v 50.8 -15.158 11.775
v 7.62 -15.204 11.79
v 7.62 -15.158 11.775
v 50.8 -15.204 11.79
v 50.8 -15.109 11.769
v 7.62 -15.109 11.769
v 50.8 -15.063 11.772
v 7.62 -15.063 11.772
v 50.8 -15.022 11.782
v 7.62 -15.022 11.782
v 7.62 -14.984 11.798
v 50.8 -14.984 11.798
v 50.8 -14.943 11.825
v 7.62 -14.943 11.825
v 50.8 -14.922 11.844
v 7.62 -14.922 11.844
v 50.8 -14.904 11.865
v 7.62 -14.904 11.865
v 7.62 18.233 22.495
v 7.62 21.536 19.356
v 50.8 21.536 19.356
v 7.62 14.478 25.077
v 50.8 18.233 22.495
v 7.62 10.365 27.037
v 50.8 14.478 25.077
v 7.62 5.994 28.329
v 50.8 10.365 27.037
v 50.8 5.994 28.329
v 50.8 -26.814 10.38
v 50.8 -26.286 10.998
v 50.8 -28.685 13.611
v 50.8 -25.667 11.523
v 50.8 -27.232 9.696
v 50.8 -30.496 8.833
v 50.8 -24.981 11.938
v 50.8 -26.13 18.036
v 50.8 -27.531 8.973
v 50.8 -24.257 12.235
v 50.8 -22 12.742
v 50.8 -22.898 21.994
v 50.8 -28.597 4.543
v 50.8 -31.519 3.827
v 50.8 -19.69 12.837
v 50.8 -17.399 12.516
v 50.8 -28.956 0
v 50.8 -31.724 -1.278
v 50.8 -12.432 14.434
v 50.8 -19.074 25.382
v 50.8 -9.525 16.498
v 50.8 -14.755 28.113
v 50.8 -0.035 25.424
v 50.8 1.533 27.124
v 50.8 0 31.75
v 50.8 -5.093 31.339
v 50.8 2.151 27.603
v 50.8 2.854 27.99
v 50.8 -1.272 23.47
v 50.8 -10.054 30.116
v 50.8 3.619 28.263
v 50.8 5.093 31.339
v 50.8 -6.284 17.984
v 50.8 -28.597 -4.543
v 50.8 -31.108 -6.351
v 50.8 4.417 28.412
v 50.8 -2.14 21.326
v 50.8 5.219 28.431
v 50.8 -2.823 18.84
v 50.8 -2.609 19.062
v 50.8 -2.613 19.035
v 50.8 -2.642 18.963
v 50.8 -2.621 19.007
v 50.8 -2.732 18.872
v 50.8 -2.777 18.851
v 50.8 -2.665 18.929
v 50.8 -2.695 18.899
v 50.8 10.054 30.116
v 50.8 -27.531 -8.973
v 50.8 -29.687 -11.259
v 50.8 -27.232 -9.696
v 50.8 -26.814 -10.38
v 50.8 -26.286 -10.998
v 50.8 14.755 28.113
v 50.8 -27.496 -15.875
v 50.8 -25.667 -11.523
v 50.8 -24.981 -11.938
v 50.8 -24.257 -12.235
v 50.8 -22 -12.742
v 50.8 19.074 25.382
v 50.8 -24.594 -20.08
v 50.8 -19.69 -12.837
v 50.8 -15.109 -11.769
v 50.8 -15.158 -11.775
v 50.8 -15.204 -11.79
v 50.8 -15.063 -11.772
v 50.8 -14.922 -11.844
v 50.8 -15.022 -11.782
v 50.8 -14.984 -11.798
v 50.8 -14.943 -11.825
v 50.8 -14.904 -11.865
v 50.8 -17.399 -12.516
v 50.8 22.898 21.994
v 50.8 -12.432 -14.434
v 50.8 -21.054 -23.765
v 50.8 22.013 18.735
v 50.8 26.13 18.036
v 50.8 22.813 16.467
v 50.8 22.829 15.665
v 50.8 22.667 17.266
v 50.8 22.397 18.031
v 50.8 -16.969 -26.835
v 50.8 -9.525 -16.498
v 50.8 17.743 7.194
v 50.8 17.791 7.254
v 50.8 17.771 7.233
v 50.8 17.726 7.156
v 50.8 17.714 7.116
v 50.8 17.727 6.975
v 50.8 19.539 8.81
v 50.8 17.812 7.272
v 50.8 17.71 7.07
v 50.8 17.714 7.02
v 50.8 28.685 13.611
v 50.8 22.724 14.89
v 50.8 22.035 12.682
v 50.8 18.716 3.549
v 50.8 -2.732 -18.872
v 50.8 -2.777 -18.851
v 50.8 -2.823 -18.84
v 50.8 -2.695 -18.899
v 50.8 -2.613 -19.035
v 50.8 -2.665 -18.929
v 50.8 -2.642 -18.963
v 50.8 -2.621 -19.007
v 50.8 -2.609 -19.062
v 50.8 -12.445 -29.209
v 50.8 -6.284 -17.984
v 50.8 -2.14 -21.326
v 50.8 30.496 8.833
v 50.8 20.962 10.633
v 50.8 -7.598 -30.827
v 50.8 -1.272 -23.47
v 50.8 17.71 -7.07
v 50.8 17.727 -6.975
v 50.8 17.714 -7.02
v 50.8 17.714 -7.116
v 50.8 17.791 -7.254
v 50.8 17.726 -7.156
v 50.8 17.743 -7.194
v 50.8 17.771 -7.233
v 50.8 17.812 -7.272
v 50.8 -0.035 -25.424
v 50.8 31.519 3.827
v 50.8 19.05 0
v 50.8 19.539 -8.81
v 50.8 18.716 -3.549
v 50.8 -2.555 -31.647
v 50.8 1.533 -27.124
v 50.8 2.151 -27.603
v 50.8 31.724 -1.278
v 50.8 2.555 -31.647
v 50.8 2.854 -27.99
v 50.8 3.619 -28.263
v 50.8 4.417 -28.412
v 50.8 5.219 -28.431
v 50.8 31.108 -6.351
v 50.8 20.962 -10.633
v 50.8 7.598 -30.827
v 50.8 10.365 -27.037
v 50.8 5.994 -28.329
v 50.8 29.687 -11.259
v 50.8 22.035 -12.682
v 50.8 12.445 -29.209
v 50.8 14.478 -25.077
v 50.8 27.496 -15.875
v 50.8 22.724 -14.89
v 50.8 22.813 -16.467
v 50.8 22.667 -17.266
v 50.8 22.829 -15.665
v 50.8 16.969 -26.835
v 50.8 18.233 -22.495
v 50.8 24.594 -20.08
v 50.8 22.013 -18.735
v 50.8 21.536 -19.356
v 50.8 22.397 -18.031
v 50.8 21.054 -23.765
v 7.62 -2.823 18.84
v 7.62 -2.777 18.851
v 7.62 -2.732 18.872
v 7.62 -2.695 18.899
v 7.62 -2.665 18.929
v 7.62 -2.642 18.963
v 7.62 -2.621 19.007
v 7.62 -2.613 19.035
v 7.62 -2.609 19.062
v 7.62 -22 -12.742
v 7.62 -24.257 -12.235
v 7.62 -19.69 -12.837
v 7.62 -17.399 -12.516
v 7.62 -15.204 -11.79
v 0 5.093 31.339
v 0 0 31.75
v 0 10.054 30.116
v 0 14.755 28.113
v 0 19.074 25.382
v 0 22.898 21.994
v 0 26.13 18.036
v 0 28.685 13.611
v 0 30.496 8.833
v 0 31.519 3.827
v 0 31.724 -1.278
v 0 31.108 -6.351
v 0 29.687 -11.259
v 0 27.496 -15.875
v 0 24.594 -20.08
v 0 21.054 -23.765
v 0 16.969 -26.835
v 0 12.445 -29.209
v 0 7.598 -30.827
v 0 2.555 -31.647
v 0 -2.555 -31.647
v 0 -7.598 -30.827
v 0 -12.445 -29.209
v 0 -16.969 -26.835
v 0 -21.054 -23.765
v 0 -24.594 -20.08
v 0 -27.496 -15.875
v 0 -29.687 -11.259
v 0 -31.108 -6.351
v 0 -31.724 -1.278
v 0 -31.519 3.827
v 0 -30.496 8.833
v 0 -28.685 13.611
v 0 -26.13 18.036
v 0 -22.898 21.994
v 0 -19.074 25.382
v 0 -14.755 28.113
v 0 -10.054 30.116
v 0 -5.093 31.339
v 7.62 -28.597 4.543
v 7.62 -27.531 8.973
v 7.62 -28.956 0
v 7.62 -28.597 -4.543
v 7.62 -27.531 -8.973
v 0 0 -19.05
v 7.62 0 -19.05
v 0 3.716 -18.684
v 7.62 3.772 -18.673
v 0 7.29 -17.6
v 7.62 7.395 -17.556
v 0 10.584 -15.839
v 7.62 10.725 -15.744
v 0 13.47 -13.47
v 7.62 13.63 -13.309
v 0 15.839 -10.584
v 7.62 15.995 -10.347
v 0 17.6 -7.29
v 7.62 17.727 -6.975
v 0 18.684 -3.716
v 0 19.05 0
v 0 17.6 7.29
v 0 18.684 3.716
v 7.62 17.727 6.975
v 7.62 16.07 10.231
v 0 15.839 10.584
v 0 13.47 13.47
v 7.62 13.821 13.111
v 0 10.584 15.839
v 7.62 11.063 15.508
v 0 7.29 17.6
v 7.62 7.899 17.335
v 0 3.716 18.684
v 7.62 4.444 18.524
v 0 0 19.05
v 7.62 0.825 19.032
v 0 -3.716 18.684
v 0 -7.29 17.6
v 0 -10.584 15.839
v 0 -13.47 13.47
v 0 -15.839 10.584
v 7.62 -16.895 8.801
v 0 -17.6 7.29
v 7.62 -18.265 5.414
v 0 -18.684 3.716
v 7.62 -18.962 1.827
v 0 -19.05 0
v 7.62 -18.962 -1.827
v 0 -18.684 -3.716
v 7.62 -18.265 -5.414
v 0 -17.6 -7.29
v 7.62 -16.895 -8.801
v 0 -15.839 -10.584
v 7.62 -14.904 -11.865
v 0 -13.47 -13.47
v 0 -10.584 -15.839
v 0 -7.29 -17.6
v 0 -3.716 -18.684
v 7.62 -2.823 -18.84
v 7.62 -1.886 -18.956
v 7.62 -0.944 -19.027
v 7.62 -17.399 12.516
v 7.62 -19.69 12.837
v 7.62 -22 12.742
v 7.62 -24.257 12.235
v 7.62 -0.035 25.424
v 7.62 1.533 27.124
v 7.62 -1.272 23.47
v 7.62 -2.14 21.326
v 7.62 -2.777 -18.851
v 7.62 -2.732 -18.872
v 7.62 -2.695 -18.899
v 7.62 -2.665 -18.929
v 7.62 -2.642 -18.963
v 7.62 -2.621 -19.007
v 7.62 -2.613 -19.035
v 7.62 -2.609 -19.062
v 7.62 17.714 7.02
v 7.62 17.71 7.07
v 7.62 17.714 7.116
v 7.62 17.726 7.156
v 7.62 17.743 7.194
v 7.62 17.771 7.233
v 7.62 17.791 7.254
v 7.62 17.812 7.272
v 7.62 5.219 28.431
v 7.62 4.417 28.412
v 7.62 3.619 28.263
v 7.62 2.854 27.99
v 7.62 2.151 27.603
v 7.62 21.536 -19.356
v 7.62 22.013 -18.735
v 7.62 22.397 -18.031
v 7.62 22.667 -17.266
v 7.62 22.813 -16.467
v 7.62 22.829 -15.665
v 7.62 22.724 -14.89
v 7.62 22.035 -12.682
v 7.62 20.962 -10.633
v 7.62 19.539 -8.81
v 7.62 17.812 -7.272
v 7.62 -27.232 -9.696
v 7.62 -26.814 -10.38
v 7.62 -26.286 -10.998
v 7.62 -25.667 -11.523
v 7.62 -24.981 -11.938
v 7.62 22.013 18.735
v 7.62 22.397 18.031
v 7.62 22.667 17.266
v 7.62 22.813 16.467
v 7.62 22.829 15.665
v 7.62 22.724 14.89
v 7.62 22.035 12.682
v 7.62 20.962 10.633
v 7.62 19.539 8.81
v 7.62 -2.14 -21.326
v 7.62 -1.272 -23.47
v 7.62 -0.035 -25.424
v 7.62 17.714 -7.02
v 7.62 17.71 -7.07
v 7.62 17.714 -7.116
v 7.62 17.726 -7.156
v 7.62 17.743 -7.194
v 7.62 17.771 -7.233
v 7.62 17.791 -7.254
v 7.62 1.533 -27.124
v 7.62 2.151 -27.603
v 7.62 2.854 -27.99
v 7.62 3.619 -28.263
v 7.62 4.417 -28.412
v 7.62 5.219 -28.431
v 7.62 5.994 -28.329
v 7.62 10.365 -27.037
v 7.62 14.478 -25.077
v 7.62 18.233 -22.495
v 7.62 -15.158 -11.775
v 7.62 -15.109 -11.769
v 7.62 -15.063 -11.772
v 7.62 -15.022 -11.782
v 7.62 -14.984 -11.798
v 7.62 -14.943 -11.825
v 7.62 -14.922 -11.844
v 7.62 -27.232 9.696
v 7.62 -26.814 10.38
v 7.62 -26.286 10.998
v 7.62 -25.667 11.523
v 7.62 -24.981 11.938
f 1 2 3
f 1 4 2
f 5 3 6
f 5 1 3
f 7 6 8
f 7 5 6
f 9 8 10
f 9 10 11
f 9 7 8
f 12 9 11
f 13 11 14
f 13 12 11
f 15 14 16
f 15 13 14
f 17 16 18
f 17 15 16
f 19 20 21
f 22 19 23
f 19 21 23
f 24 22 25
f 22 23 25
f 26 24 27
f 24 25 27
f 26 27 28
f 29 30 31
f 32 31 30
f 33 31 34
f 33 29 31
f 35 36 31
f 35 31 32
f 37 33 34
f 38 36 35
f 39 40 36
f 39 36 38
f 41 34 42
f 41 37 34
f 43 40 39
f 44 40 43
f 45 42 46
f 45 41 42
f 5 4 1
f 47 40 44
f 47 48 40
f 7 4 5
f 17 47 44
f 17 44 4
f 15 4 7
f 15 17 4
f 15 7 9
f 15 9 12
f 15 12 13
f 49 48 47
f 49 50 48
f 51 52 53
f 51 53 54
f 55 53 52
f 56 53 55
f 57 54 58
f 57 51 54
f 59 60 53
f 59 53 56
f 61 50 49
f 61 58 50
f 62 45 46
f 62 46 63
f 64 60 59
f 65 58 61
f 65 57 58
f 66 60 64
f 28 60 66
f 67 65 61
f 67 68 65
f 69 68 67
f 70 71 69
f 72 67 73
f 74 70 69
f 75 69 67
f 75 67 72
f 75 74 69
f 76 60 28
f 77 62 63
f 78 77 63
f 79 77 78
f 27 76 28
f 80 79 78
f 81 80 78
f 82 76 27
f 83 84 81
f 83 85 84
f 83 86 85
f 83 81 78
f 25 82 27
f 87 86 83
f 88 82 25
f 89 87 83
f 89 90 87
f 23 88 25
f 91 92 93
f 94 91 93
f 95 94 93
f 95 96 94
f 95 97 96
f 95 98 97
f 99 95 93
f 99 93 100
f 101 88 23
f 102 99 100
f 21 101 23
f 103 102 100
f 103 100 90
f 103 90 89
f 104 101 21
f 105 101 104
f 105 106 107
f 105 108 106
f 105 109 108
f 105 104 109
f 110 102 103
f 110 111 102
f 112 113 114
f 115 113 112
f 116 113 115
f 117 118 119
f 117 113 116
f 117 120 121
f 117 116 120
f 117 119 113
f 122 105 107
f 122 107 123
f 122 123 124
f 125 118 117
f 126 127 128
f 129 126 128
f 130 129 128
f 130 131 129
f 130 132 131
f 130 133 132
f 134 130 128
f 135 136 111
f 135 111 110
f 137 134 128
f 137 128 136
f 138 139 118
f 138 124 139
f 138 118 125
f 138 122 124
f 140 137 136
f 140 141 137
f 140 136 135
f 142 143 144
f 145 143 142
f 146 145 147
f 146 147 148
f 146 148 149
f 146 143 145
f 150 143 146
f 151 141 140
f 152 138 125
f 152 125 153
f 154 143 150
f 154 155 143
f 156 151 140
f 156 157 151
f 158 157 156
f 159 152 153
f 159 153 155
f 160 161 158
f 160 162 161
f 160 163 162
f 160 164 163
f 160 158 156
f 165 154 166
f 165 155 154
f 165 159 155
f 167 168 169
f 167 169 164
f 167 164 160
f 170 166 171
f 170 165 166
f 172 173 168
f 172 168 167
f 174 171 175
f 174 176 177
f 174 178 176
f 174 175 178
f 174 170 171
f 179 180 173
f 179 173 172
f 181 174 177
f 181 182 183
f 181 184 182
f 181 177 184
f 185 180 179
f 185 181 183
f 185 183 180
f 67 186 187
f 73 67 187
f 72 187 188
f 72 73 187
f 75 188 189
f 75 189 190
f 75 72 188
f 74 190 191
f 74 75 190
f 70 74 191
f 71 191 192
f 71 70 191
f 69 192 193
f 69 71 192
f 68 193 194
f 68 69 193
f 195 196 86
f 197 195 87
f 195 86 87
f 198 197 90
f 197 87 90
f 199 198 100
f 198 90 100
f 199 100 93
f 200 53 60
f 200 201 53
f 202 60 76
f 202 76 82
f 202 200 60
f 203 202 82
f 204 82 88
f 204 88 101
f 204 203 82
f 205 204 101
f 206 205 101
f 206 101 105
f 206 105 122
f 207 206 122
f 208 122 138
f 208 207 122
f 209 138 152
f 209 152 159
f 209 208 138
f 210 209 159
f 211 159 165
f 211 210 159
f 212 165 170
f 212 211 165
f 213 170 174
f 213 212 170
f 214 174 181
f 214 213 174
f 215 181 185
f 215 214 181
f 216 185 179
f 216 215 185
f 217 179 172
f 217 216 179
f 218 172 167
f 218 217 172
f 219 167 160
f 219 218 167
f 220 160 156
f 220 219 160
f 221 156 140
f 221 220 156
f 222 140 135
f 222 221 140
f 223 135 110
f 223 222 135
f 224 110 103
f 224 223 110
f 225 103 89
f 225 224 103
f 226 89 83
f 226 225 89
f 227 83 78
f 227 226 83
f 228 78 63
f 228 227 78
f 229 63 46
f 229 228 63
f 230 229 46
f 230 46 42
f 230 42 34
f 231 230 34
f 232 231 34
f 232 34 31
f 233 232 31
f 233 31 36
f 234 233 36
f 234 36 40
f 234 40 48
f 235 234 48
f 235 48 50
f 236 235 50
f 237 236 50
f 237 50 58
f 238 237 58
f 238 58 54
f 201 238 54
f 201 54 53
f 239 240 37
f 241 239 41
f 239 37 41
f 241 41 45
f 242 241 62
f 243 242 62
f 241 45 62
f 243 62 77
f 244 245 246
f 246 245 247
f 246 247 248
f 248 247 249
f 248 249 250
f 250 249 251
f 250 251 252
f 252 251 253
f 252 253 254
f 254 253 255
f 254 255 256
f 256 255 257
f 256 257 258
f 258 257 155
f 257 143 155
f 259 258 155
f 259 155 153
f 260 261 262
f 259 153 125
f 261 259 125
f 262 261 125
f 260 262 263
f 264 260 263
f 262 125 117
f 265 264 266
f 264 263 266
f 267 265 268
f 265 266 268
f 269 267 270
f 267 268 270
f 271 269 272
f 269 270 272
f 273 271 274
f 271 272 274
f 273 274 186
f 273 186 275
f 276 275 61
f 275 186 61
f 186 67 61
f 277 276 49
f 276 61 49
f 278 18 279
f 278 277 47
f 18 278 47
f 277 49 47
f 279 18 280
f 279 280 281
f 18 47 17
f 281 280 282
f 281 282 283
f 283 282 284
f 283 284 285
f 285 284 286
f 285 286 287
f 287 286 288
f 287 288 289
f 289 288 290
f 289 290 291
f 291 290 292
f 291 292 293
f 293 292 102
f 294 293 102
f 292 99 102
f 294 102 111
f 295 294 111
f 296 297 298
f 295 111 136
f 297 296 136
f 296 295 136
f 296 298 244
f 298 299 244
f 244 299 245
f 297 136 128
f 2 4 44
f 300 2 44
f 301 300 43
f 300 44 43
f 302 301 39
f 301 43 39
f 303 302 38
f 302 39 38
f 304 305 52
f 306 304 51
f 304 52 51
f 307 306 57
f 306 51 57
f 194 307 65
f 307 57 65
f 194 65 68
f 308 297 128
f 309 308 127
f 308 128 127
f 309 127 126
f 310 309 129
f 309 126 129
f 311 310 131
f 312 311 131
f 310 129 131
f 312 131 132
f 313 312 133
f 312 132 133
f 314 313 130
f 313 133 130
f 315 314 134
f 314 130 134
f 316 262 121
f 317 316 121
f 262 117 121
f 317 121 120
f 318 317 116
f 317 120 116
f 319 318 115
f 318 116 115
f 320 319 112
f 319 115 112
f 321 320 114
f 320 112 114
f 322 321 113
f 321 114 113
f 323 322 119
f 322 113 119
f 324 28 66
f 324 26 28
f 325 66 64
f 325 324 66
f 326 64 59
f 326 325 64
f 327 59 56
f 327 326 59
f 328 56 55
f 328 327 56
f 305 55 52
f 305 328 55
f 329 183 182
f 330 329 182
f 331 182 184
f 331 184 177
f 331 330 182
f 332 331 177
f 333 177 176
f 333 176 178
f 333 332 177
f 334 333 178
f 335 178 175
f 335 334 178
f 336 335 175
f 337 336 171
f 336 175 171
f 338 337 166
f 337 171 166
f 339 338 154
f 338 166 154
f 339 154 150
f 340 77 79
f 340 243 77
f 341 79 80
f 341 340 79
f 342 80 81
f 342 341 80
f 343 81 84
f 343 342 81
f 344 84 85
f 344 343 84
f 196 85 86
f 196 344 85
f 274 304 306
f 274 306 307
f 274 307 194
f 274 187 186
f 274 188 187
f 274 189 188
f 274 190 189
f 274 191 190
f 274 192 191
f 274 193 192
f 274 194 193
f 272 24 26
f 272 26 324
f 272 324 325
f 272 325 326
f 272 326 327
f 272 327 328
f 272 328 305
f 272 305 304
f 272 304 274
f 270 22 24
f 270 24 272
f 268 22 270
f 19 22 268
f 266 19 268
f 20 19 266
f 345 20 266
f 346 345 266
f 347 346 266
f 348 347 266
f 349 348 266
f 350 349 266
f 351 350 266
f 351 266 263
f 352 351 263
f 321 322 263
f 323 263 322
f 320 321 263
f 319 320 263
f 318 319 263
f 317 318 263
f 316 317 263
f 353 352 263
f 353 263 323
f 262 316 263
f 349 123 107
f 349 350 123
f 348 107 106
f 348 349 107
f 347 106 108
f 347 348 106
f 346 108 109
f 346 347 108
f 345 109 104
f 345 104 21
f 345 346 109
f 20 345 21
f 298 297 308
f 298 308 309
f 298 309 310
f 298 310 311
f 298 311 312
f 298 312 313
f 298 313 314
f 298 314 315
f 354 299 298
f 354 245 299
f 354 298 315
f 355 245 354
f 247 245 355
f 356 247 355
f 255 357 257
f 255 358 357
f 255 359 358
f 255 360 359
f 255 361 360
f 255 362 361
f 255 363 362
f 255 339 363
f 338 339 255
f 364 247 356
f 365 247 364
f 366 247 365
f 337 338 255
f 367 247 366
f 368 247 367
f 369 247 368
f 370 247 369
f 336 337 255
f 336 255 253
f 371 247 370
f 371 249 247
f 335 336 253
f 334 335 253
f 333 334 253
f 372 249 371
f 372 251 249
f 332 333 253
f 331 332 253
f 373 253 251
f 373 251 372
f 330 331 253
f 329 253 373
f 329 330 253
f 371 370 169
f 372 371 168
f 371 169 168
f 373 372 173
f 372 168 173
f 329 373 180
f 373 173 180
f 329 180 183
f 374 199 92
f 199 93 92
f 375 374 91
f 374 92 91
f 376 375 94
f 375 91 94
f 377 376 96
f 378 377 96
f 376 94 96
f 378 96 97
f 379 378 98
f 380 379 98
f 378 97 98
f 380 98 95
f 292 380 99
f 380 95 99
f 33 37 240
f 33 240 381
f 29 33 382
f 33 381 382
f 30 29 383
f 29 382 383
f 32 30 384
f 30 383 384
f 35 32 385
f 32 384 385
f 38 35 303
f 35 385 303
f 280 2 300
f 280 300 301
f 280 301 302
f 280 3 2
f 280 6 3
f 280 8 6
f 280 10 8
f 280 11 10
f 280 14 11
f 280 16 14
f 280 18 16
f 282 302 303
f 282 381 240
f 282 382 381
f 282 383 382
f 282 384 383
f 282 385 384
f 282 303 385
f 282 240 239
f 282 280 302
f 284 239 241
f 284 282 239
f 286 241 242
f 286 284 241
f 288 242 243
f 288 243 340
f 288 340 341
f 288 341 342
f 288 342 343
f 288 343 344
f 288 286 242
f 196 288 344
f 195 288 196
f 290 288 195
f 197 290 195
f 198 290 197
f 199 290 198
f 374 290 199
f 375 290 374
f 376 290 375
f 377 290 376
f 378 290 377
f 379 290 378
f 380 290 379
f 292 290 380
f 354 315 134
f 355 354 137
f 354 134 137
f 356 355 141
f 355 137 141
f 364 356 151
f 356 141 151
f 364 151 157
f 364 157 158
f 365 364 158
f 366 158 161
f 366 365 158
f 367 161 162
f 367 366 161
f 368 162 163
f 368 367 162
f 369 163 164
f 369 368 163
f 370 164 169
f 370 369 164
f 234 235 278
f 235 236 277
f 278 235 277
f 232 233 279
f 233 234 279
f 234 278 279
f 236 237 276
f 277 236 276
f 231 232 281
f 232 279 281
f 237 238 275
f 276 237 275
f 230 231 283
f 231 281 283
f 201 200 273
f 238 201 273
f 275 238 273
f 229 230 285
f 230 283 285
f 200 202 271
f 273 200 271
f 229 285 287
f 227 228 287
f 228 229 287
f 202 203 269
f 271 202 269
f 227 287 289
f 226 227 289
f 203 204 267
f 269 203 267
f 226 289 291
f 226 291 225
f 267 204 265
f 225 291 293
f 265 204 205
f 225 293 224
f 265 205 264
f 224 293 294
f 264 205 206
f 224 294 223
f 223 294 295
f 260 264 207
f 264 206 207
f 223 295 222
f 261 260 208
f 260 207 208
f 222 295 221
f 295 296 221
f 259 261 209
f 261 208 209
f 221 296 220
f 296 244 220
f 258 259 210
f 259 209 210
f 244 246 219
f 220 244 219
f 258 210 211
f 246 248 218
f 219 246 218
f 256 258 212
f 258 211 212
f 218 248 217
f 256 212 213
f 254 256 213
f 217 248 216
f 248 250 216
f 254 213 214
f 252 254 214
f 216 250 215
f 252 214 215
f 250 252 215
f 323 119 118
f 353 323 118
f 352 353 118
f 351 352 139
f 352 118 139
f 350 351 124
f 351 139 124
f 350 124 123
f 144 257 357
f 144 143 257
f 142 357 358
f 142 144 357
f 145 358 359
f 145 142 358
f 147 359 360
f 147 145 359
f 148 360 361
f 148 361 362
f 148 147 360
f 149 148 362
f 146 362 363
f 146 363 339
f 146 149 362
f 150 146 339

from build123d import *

# Parameters (mm, degrees)
SKETCH1_W             = 50.8
SKETCH1_H             = 31.75
CUT_EXTRUDE1_DEPTH    = 43.18
CUT_EXTRUDE2_DEPTH    = 43.18
CUT_EXTRUDE3_DEPTH    = 43.18
M36_CLEARANCE_HOLE1_D = 38.1
FILLET1_R             = 5.08
FILLET2_R             = 0.254


with BuildPart() as part:
    # Sketch1 → Revolve1 (revolve)
    with BuildSketch(Plane(origin=(0, 0, 0), x_dir=(-1, 0, 0), z_dir=(0, 0, -1)), mode=Mode.PRIVATE) as revolve1_sk:
        with Locations((-25.4, 15.875)):
            Rectangle(SKETCH1_W, SKETCH1_H)
    revolve(revolve1_sk.sketch.rotate(Axis((50.8, 0, 0), (-1, 0, 0)), 270), axis=Axis((50.8, 0, 0), (-1, 0, 0)))

    # Sketch2 → Cut-Extrude1 (cut)
    with BuildSketch(Plane(origin=(50.8, 0, 0), x_dir=(0, 0, -1), z_dir=(1, 0, 0))):
        with BuildLine():
            ThreePointArc((-17.574990767, 23.012380049), (-25.076631592, 14.478), (-28.716801108, 3.714198451))
            ThreePointArc((-28.716801108, 3.714198451), (-6.467131306, 3.7338), (-17.574990767, 23.012380049))
        make_face()
    extrude(amount=-CUT_EXTRUDE1_DEPTH, mode=Mode.SUBTRACT)

    # Sketch3 → Cut-Extrude2 (cut)
    with BuildSketch(Plane(origin=(50.8, 0, 0), x_dir=(0, 0, -1), z_dir=(1, 0, 0))):
        with BuildLine():
            ThreePointArc((-11.141810341, -26.7265785), (0, -28.956), (11.141810341, -26.7265785))
            ThreePointArc((11.141810341, -26.7265785), (0, -7.4676), (-11.141810341, -26.7265785))
        make_face()
    extrude(amount=-CUT_EXTRUDE2_DEPTH, mode=Mode.SUBTRACT)

    # Sketch4 → Cut-Extrude3 (cut)
    with BuildSketch(Plane(origin=(50.8, 0, 0), x_dir=(0, 0, -1), z_dir=(1, 0, 0))):
        with BuildLine():
            ThreePointArc((28.716801108, 3.714198451), (25.076631592, 14.478), (17.574990767, 23.01238005))
            ThreePointArc((17.574990767, 23.01238005), (6.467131305, 3.7338), (28.716801108, 3.714198451))
        make_face()
    extrude(amount=-CUT_EXTRUDE3_DEPTH, mode=Mode.SUBTRACT)

    # M36 Clearance Hole1 (through all)
    with Locations(Plane.ZY):
        with Locations((0, 0)):
            Hole(M36_CLEARANCE_HOLE1_D / 2)

    # Fillet1
    fillet1_edges = [part.edges().sort_by_distance(p)[0] for p in [
        (29.21, 23.012380049, 17.574990767),
        (29.21, 3.714198451, 28.716801108),
        (29.21, -26.7265785, 11.141810341),
        (29.21, -26.7265785, -11.141810341),
        (29.21, 3.714198451, -28.716801108),
        (29.21, 23.01238005, -17.574990767),
    ]]
    fillet(fillet1_edges, radius=FILLET1_R)

    # Fillet2
    fillet2_edges = [part.edges().sort_by_distance(p)[0] for p in [
        (29.21, 17.654613605, -7.156613617),
        (29.21, -2.629497604, -18.867650684),
        (29.21, 17.654613605, 7.156613618),
        (29.21, -15.025116, -11.711037067),
        (29.21, -15.025116, 11.711037067),
        (29.21, -2.629497604, 18.867650684),
    ]]
    fillet(fillet2_edges, radius=FILLET2_R)


solid = part.part
